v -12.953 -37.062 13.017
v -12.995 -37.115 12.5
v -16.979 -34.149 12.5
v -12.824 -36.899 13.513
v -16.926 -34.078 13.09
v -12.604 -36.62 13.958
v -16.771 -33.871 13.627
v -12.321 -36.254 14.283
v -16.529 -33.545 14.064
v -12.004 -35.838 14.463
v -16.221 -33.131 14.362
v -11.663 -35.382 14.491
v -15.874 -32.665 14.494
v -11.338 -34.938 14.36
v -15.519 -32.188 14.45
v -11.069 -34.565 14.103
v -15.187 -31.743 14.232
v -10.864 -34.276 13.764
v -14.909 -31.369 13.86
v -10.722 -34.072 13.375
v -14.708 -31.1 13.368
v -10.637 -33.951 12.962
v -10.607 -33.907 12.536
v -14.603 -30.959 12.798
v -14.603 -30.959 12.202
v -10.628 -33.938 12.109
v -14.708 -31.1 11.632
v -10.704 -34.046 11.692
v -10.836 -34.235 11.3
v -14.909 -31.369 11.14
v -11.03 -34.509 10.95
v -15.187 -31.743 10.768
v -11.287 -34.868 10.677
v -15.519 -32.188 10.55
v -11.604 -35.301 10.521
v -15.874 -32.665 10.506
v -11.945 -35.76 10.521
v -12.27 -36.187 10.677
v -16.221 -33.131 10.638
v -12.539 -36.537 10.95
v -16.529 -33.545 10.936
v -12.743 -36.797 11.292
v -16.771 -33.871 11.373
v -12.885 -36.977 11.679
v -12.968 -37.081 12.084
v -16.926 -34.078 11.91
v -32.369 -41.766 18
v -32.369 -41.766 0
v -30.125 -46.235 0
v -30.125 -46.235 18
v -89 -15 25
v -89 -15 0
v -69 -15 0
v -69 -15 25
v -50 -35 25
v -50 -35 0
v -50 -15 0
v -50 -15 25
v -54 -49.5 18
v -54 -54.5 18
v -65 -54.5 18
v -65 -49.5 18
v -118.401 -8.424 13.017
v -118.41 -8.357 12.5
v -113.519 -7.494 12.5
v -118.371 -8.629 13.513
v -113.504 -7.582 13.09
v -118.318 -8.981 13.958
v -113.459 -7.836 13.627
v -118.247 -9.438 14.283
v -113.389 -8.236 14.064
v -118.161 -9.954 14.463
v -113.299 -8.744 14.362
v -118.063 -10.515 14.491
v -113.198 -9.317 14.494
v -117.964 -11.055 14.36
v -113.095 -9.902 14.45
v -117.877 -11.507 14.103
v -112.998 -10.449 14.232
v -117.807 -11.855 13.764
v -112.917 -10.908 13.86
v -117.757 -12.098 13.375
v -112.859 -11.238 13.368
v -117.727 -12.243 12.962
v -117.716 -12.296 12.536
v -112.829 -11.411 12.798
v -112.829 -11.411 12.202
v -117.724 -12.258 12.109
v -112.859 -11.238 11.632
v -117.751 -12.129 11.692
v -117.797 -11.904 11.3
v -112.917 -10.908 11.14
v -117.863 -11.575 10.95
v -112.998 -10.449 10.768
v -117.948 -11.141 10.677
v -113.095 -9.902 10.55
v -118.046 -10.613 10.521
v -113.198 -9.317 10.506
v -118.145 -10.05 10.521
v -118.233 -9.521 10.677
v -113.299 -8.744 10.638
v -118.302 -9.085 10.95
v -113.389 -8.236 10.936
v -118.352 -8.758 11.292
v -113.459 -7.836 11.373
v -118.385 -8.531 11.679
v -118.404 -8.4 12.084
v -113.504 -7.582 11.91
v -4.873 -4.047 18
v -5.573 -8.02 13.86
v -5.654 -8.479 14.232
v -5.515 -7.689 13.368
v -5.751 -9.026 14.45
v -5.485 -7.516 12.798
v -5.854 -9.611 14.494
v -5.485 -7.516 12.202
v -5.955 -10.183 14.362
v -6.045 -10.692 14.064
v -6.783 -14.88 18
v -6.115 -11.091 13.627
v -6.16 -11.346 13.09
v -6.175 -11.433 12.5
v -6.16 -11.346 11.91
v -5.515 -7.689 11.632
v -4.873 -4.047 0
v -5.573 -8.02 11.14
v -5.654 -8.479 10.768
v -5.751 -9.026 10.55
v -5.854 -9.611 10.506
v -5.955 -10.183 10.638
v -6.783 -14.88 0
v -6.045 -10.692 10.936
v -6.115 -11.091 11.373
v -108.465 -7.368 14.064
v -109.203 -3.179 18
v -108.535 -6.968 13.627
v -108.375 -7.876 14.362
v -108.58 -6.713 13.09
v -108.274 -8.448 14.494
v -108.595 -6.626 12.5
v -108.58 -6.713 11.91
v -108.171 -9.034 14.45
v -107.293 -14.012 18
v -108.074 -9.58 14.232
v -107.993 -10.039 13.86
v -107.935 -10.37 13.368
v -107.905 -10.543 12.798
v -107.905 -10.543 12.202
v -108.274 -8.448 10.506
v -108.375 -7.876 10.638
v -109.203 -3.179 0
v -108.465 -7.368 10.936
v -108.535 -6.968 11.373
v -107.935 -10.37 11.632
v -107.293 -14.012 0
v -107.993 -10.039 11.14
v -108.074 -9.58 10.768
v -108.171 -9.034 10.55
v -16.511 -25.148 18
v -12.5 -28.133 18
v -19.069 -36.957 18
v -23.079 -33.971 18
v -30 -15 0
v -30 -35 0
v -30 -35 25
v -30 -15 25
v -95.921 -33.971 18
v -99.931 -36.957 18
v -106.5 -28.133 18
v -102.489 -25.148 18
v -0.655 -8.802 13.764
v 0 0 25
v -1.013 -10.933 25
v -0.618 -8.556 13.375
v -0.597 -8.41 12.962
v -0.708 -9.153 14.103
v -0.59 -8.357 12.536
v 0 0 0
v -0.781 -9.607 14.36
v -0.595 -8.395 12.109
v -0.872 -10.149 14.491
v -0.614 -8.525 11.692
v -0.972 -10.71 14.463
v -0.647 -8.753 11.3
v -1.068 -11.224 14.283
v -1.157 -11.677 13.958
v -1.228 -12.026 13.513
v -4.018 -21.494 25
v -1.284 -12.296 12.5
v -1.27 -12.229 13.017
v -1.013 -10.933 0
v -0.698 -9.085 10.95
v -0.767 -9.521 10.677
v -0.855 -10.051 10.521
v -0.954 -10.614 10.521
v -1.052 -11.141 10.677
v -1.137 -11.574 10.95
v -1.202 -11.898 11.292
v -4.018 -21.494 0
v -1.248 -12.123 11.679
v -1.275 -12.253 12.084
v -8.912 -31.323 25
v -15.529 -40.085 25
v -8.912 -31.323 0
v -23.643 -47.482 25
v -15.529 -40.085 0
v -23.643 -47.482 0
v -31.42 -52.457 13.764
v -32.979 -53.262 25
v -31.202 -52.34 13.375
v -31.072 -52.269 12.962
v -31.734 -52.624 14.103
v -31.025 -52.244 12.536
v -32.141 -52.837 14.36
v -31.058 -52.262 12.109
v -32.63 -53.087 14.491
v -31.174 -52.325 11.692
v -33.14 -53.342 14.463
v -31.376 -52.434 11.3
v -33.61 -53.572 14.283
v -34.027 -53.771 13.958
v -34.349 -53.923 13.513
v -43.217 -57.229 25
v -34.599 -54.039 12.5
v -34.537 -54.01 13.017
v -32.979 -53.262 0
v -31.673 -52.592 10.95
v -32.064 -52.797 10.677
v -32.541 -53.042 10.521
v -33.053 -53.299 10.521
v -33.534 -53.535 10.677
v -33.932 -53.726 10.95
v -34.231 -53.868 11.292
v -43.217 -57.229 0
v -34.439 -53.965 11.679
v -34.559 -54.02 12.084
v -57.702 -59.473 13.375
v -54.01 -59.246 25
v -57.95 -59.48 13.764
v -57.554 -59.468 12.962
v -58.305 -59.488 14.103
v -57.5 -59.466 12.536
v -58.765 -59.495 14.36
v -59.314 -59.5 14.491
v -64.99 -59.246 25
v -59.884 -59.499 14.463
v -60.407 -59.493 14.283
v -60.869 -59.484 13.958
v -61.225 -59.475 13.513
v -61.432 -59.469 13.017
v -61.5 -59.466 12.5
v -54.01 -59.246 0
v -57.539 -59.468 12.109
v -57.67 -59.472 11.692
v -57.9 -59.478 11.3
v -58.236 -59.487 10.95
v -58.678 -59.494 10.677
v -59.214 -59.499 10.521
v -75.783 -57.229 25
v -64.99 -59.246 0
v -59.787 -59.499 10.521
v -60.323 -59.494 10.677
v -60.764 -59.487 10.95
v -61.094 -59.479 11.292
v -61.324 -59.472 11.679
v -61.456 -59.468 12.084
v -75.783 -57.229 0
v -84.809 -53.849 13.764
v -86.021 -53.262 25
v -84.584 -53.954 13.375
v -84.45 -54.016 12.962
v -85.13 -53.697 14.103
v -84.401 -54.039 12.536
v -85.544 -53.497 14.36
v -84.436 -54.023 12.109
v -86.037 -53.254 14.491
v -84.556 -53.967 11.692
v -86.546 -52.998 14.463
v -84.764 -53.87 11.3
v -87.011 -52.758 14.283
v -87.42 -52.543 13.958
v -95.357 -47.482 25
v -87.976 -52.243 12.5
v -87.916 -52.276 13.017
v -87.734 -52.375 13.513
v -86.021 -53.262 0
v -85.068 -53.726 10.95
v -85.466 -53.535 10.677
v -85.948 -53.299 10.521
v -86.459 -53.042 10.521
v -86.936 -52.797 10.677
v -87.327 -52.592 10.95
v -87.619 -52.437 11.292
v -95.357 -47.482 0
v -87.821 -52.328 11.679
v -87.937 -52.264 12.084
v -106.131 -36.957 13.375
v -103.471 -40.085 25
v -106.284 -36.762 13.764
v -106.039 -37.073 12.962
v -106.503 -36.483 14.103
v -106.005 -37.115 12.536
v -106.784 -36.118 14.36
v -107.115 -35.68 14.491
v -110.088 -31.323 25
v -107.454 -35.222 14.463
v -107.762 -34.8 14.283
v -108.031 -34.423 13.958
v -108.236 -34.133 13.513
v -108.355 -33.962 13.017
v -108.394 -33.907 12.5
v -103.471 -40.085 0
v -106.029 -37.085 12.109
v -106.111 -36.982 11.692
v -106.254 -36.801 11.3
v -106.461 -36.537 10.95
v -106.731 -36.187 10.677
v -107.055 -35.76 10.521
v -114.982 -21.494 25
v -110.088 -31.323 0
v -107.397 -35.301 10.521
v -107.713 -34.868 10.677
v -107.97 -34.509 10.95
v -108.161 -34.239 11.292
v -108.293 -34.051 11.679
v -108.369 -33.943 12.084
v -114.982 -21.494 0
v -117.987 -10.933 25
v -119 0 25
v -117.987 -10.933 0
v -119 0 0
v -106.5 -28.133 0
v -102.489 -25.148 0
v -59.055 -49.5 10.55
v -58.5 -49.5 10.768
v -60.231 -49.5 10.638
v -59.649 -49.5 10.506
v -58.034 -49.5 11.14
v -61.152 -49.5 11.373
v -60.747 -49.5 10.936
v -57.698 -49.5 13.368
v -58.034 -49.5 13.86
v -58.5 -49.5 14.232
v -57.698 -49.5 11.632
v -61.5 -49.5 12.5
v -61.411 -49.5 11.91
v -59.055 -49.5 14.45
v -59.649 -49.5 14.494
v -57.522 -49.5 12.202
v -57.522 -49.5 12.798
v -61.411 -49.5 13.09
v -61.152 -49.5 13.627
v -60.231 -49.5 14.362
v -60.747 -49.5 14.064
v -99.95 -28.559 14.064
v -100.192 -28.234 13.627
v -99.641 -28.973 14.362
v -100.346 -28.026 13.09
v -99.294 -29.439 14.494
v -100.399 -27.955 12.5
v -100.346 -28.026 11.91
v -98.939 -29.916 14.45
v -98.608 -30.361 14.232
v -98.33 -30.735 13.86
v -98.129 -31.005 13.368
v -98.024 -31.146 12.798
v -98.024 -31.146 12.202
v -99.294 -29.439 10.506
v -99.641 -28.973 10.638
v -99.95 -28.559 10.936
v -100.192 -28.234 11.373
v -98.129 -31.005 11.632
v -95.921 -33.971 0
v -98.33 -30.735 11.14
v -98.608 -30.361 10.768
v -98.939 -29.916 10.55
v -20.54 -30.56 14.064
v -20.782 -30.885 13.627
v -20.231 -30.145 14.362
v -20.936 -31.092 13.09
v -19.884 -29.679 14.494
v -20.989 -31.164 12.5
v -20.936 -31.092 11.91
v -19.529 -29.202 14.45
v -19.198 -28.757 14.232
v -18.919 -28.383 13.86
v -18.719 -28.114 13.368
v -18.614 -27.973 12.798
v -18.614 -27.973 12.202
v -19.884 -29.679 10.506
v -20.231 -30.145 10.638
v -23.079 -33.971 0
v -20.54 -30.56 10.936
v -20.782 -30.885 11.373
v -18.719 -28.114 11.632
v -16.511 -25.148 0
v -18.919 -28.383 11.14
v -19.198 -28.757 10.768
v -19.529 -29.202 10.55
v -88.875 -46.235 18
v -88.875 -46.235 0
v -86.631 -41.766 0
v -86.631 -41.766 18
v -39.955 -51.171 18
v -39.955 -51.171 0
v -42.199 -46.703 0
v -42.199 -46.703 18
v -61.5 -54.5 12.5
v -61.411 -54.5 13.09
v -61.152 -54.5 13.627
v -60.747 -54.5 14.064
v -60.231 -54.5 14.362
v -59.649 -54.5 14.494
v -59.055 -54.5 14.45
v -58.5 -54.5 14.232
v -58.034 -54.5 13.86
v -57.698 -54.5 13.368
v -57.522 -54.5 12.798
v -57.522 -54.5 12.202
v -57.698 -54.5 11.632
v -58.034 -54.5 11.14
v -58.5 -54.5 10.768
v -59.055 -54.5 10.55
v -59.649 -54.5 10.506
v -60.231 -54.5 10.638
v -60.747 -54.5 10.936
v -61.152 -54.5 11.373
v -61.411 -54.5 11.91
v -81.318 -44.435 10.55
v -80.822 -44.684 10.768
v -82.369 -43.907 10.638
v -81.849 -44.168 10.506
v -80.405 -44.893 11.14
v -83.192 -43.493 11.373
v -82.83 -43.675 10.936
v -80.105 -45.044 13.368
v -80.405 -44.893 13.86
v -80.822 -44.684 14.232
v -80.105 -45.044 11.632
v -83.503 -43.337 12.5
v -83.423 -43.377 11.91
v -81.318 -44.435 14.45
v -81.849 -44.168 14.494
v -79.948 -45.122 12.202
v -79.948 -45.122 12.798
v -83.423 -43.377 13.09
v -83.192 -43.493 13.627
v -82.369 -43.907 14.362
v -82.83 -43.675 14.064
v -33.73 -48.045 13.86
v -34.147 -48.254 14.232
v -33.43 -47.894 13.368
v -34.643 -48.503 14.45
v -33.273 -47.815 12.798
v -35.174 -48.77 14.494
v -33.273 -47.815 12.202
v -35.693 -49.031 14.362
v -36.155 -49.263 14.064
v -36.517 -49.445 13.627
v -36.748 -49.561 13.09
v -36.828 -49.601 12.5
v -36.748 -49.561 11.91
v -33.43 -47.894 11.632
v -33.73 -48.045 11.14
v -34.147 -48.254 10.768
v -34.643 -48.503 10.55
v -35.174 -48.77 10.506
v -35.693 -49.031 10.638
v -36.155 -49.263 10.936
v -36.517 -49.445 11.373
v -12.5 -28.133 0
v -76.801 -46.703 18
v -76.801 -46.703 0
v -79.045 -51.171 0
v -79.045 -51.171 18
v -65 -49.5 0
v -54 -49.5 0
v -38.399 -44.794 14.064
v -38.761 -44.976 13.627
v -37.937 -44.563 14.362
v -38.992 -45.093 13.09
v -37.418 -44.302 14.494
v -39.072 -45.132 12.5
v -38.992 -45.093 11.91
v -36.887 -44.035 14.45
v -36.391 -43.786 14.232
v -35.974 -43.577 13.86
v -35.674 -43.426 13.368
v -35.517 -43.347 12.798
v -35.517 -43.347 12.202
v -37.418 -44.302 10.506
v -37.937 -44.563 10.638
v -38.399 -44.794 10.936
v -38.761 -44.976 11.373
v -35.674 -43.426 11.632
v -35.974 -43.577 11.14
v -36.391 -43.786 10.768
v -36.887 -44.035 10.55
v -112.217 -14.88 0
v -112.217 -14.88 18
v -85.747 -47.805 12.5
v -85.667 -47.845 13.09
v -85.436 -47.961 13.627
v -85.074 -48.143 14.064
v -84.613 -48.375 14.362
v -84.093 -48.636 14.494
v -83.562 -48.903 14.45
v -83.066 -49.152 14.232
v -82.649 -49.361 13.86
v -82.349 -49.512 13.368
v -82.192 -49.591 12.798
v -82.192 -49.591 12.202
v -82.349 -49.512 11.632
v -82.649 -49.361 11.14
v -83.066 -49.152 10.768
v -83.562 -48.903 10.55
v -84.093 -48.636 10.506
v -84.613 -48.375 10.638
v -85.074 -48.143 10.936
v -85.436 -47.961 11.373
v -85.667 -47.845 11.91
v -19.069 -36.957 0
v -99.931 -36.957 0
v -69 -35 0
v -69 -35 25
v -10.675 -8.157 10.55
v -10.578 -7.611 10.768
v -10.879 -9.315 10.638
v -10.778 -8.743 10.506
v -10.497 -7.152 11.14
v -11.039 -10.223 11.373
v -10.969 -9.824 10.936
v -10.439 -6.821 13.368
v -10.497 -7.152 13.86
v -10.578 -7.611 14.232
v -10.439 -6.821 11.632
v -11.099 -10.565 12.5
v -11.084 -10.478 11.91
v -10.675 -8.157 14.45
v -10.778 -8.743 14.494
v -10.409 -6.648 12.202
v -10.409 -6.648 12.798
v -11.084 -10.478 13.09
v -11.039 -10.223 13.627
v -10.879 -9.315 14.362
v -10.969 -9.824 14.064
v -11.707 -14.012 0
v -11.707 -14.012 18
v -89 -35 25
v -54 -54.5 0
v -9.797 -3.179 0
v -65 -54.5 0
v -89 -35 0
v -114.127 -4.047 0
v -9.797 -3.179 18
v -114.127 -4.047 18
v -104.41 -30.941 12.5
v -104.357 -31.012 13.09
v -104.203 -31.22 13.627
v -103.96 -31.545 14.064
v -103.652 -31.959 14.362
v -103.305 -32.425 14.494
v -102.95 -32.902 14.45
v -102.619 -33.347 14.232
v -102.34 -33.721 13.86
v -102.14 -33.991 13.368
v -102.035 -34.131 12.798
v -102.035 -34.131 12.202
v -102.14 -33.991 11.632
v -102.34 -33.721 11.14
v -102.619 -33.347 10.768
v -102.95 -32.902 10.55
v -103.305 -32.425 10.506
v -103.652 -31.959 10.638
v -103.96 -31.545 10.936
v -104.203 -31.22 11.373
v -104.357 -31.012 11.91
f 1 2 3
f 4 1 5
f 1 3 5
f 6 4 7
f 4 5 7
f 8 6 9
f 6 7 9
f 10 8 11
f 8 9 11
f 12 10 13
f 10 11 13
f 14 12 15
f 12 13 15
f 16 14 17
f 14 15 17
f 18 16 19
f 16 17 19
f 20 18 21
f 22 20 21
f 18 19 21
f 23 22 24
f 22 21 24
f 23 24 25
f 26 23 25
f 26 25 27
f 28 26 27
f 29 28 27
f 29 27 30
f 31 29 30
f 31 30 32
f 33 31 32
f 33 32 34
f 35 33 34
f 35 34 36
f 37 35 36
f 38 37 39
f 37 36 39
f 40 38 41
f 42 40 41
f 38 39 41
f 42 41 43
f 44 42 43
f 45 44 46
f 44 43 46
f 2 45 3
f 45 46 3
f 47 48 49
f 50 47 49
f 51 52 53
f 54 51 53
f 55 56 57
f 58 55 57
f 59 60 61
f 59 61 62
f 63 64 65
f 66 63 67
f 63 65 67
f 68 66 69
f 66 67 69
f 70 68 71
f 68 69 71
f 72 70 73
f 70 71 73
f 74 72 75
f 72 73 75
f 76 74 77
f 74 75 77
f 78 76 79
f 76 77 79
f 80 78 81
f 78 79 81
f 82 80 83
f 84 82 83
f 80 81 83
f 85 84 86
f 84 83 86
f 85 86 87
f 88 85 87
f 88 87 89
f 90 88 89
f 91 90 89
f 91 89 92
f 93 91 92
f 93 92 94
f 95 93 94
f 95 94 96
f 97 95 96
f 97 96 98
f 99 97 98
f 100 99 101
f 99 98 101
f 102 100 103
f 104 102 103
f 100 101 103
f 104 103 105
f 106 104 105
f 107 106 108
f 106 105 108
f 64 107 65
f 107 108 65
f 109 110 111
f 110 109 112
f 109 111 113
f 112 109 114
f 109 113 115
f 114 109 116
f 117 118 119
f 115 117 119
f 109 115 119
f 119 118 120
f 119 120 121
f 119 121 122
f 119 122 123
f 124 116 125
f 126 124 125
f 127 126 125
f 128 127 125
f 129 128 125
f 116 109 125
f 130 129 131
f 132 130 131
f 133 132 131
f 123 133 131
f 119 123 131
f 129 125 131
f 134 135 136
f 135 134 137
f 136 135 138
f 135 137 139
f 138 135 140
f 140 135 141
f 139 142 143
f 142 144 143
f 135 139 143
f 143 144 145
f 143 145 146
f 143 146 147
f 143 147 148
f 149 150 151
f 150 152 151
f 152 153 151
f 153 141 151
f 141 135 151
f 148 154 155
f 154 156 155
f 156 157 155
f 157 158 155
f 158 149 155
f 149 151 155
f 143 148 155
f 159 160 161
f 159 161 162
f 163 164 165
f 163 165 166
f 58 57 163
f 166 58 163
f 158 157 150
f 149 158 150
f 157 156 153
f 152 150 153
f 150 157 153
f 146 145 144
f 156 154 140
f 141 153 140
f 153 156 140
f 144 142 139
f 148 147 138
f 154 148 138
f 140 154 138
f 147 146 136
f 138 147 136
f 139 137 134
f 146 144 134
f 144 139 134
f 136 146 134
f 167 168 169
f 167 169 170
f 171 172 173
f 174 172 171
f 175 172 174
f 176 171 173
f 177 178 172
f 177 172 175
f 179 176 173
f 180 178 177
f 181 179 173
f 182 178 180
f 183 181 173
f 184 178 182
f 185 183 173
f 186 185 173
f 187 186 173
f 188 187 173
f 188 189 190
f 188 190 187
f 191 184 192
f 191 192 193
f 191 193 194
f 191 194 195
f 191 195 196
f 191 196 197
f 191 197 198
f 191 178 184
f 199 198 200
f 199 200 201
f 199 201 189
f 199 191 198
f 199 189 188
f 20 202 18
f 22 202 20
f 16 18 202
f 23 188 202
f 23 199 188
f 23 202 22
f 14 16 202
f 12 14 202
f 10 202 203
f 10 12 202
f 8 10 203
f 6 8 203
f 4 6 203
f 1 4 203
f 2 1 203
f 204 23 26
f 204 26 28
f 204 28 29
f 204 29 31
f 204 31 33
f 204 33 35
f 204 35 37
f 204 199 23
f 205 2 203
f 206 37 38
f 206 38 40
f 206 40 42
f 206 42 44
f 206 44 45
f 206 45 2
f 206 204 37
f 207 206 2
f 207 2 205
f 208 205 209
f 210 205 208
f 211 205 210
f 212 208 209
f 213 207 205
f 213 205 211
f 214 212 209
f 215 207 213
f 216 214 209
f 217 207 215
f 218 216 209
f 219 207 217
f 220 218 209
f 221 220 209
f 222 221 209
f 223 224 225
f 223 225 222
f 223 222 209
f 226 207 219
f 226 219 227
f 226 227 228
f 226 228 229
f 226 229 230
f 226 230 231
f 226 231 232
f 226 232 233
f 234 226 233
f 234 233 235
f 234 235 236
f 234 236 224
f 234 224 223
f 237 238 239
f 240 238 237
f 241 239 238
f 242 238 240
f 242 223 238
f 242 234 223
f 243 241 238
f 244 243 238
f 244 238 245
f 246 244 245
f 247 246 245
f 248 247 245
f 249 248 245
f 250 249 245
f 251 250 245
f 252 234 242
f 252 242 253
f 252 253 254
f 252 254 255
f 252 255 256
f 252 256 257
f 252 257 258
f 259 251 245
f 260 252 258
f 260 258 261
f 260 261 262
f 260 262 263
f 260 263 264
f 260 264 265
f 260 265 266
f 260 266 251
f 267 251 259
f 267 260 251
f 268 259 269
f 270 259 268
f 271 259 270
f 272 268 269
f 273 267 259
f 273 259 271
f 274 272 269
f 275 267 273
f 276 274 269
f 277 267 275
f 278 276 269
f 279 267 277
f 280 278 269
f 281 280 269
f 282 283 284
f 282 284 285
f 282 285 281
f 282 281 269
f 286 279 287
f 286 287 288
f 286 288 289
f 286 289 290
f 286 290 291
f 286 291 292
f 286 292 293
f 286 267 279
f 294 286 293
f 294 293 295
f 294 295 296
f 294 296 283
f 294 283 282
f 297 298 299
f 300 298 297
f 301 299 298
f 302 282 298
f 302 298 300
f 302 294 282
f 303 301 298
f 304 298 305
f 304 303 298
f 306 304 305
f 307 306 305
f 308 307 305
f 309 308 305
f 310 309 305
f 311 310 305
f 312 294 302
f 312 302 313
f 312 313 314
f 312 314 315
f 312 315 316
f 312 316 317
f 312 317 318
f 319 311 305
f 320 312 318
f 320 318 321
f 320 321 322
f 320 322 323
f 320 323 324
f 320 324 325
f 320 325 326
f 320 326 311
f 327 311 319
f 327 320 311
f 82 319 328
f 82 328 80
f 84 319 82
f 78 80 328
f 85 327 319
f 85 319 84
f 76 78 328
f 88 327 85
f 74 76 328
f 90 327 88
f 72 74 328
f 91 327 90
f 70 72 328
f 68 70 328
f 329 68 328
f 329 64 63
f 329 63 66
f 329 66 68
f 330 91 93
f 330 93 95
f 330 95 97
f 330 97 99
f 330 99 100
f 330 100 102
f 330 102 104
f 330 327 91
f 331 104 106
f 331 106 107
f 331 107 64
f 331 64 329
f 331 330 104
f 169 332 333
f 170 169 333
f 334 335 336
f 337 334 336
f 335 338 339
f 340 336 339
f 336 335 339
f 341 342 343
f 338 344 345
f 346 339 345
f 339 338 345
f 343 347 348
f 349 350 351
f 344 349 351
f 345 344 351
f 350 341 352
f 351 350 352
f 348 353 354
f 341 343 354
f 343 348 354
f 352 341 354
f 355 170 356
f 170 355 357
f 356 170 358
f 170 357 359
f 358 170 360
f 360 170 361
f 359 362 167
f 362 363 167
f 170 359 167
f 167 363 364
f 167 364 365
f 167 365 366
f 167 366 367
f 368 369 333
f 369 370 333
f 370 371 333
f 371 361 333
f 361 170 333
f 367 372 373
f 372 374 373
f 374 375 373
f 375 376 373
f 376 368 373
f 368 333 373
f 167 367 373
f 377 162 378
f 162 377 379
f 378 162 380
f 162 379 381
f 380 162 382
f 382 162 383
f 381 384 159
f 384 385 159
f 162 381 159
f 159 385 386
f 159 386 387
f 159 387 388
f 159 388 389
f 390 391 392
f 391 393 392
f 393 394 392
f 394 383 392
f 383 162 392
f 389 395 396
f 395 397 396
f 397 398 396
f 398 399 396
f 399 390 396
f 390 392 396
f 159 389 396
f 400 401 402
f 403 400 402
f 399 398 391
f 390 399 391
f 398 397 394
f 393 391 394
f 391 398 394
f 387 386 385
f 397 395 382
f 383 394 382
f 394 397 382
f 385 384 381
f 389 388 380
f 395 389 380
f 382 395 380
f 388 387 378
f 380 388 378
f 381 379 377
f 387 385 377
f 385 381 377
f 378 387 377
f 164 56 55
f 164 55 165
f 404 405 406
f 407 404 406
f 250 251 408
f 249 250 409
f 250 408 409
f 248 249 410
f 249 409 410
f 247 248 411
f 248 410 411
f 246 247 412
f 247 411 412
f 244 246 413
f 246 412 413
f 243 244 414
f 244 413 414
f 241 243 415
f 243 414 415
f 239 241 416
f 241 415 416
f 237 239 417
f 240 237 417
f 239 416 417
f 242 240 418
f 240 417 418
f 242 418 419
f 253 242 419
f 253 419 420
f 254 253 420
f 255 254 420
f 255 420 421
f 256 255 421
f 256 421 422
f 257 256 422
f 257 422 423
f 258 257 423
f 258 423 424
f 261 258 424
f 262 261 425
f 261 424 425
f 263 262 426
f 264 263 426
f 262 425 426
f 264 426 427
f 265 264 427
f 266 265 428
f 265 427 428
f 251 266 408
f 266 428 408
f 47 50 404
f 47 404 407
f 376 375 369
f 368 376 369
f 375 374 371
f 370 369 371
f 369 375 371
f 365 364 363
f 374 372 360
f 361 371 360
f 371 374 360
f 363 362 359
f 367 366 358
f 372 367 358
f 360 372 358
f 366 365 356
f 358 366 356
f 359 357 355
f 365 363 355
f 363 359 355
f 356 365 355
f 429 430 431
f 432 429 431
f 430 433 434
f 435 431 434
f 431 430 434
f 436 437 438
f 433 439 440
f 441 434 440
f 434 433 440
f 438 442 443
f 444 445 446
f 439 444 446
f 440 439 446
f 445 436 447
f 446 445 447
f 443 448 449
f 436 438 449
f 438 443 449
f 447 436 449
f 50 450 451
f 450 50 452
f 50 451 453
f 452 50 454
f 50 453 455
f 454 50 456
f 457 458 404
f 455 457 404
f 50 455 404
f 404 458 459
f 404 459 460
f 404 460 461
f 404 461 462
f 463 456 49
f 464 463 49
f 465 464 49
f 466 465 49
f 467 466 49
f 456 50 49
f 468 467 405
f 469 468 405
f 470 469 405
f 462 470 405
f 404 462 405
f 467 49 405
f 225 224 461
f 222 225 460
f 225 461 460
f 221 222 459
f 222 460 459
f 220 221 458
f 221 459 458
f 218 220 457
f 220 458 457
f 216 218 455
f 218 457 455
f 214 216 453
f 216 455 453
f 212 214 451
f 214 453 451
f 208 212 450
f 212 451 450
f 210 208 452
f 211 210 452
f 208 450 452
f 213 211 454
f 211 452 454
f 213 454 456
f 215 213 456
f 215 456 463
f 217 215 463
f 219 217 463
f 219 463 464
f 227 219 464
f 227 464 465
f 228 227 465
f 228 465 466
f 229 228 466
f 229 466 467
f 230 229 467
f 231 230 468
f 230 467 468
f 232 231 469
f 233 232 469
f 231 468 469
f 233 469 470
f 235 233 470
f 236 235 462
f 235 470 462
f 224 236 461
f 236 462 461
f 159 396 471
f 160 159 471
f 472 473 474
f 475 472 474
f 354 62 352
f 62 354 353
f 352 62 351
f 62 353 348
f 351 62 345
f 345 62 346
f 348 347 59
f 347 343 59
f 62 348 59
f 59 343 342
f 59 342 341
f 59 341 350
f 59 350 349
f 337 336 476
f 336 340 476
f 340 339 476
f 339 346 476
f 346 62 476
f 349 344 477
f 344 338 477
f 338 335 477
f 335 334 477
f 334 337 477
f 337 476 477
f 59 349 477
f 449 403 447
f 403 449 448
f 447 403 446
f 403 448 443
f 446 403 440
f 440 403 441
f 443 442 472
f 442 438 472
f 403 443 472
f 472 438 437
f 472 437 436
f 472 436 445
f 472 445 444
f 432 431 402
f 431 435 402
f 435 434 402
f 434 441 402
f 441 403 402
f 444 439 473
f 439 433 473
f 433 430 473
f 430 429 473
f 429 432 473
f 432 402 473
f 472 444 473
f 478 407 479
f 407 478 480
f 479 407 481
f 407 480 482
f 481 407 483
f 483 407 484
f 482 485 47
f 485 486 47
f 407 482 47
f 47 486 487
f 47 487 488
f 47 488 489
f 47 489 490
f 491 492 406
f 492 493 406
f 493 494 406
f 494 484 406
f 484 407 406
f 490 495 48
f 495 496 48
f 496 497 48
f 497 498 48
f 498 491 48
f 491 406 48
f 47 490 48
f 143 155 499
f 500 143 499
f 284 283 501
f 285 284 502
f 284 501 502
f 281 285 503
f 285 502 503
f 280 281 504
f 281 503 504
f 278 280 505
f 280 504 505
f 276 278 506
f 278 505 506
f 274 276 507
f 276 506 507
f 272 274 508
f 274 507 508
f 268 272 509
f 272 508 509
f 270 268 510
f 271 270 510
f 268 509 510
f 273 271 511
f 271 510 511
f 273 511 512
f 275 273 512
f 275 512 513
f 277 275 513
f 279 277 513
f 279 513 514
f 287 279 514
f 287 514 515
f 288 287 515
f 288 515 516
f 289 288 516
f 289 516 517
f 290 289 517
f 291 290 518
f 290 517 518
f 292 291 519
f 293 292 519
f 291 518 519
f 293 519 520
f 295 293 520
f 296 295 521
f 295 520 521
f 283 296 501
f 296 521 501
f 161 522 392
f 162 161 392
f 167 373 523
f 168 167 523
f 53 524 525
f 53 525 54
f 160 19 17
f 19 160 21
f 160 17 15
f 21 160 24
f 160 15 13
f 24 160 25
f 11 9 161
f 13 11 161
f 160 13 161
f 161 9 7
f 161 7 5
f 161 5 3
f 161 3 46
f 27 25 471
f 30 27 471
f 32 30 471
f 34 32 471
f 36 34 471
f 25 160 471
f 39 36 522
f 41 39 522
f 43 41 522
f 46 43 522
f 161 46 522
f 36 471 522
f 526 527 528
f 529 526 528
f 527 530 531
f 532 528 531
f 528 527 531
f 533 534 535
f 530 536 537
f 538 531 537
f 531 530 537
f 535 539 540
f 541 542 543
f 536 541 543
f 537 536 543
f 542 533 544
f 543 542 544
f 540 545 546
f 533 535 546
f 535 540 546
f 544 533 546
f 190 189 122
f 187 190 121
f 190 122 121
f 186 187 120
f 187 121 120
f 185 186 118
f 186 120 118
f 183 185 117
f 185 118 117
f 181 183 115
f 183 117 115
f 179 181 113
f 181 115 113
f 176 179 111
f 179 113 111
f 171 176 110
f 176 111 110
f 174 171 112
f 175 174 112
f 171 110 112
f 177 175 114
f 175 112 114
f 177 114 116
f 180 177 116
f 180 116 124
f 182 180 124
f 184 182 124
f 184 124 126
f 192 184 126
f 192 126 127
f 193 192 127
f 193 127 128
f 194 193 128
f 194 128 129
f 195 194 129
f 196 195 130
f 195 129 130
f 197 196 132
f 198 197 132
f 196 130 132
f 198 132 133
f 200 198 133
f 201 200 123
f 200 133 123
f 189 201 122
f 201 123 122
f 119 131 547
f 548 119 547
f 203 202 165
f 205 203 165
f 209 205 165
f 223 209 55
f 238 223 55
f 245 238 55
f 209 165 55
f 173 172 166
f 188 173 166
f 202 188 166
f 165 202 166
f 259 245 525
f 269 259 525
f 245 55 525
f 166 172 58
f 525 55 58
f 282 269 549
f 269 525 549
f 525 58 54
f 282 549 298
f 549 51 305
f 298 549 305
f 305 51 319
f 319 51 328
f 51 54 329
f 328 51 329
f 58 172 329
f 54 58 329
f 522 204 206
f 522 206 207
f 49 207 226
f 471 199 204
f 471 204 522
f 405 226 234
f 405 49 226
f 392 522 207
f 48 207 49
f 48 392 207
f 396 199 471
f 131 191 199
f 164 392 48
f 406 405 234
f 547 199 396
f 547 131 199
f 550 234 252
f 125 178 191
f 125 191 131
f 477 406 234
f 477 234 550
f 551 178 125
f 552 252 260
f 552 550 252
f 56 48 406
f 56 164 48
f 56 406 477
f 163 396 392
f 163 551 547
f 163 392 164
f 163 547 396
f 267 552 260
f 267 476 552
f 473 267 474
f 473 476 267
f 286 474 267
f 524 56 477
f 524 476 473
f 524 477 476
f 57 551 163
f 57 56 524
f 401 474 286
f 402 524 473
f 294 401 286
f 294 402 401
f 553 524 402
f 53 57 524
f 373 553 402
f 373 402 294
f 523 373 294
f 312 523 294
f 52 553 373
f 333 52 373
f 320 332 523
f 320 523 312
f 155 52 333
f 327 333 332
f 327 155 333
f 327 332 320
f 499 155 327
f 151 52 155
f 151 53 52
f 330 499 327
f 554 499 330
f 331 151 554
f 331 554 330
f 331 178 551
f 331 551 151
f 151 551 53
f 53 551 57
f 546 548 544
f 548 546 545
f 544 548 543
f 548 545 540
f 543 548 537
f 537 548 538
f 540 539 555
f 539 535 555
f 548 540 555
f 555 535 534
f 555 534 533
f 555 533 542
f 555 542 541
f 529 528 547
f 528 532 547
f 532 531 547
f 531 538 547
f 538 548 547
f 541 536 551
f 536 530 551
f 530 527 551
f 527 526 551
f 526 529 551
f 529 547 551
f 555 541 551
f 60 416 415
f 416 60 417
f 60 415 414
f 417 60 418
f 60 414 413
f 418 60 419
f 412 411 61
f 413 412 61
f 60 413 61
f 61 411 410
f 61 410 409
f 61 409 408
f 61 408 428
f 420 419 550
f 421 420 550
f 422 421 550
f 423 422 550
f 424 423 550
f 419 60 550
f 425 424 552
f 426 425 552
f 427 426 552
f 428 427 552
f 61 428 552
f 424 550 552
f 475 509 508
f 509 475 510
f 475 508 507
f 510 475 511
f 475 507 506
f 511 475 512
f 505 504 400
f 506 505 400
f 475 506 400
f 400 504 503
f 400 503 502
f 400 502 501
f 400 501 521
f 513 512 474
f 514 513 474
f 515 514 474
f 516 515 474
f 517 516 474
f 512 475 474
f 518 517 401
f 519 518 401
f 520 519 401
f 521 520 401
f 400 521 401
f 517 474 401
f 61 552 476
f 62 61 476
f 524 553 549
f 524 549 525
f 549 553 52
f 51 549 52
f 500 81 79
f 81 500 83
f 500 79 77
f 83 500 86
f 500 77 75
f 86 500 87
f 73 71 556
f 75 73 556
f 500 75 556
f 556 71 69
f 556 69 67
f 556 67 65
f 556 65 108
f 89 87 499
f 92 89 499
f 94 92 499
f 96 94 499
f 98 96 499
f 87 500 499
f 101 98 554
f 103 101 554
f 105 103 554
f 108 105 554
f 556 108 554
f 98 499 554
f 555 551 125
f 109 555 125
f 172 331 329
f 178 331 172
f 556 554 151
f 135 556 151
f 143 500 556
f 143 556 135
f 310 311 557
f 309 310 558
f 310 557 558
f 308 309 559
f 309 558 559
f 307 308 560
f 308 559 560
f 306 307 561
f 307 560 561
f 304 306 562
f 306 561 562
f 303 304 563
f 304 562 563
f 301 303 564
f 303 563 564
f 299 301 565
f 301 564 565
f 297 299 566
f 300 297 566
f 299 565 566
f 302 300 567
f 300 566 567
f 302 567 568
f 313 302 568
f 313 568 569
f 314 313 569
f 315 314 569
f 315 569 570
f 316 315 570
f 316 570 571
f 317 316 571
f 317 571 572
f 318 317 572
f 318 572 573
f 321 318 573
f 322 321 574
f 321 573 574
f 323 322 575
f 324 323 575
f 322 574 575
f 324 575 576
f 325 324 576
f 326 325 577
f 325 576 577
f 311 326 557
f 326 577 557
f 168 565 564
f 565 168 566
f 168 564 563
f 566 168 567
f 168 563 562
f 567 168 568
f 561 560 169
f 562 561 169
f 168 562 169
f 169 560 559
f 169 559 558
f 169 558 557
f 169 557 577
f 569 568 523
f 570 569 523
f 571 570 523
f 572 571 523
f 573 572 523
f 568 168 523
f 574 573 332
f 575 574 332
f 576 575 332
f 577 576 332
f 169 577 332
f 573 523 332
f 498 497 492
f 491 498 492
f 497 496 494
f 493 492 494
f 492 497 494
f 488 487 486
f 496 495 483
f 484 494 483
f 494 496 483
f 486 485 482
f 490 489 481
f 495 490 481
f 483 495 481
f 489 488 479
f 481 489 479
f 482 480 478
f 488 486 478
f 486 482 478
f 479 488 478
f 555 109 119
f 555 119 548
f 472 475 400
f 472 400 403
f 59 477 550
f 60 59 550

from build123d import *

# Parameters (mm, degrees)
SKETCH1_W           = 20
SKETCH1_H           = 20
BOSS_EXTRUDE1_DEPTH = 25
HOLE1_D             = 4
HOLE1_DEPTH         = 10
CUT_EXTRUDE1_DEPTH  = 18
CIRPATTERN1_COUNT   = 7
CIRPATTERN1_ANGLE   = 160


with BuildPart() as part:
    # Sketch1 → Boss-Extrude1 (new body)
    with BuildSketch(Plane.XY):
        with BuildLine():
            Line((-119, 0), (0, 0))
            ThreePointArc((0, 0), (-59.5, -59.5), (-119, 0))
        make_face()
        with Locations((-40, -25)):
            Rectangle(SKETCH1_W, SKETCH1_H, mode=Mode.SUBTRACT)
        with Locations((-79, -25)):
            Rectangle(SKETCH1_W, SKETCH1_H, mode=Mode.SUBTRACT)
    extrude(amount=BOSS_EXTRUDE1_DEPTH)

    # Hole1
    with Locations(Plane(origin=(-0.903938696, -10.332066571, 12.5), x_dir=(0.173648177667, 0.984807753012, 0), z_dir=(0.984807753012, -0.173648177667, 0))):
        with Locations((0, 0)):
            hole1 = Hole(HOLE1_D / 2, depth=HOLE1_DEPTH)

    # Sketch7 → Cut-Extrude1 (cut)
    with BuildSketch(Plane(origin=(0, 0, 0), x_dir=(-1, 0, 0), z_dir=(0, 0, -1))):
        Polygon((4.872912484, -4.047383041), (6.783042438, -14.880268324), (11.707081203, -14.012027436), (9.796951249, -3.179142153), align=None)
    cut_extrude1 = extrude(amount=-CUT_EXTRUDE1_DEPTH, mode=Mode.SUBTRACT)

    # CirPattern1: Hole1, Cut-Extrude1 ×7 about axis
    cirpattern1_axis = Axis((-59.5, 0, 0), (0, 0, -1))
    add([hole1.rotate(cirpattern1_axis, i * CIRPATTERN1_ANGLE / (CIRPATTERN1_COUNT - 1)) for i in range(1, CIRPATTERN1_COUNT)], mode=Mode.SUBTRACT)
    add([cut_extrude1.rotate(cirpattern1_axis, i * CIRPATTERN1_ANGLE / (CIRPATTERN1_COUNT - 1)) for i in range(1, CIRPATTERN1_COUNT)], mode=Mode.SUBTRACT)


solid = part.part
